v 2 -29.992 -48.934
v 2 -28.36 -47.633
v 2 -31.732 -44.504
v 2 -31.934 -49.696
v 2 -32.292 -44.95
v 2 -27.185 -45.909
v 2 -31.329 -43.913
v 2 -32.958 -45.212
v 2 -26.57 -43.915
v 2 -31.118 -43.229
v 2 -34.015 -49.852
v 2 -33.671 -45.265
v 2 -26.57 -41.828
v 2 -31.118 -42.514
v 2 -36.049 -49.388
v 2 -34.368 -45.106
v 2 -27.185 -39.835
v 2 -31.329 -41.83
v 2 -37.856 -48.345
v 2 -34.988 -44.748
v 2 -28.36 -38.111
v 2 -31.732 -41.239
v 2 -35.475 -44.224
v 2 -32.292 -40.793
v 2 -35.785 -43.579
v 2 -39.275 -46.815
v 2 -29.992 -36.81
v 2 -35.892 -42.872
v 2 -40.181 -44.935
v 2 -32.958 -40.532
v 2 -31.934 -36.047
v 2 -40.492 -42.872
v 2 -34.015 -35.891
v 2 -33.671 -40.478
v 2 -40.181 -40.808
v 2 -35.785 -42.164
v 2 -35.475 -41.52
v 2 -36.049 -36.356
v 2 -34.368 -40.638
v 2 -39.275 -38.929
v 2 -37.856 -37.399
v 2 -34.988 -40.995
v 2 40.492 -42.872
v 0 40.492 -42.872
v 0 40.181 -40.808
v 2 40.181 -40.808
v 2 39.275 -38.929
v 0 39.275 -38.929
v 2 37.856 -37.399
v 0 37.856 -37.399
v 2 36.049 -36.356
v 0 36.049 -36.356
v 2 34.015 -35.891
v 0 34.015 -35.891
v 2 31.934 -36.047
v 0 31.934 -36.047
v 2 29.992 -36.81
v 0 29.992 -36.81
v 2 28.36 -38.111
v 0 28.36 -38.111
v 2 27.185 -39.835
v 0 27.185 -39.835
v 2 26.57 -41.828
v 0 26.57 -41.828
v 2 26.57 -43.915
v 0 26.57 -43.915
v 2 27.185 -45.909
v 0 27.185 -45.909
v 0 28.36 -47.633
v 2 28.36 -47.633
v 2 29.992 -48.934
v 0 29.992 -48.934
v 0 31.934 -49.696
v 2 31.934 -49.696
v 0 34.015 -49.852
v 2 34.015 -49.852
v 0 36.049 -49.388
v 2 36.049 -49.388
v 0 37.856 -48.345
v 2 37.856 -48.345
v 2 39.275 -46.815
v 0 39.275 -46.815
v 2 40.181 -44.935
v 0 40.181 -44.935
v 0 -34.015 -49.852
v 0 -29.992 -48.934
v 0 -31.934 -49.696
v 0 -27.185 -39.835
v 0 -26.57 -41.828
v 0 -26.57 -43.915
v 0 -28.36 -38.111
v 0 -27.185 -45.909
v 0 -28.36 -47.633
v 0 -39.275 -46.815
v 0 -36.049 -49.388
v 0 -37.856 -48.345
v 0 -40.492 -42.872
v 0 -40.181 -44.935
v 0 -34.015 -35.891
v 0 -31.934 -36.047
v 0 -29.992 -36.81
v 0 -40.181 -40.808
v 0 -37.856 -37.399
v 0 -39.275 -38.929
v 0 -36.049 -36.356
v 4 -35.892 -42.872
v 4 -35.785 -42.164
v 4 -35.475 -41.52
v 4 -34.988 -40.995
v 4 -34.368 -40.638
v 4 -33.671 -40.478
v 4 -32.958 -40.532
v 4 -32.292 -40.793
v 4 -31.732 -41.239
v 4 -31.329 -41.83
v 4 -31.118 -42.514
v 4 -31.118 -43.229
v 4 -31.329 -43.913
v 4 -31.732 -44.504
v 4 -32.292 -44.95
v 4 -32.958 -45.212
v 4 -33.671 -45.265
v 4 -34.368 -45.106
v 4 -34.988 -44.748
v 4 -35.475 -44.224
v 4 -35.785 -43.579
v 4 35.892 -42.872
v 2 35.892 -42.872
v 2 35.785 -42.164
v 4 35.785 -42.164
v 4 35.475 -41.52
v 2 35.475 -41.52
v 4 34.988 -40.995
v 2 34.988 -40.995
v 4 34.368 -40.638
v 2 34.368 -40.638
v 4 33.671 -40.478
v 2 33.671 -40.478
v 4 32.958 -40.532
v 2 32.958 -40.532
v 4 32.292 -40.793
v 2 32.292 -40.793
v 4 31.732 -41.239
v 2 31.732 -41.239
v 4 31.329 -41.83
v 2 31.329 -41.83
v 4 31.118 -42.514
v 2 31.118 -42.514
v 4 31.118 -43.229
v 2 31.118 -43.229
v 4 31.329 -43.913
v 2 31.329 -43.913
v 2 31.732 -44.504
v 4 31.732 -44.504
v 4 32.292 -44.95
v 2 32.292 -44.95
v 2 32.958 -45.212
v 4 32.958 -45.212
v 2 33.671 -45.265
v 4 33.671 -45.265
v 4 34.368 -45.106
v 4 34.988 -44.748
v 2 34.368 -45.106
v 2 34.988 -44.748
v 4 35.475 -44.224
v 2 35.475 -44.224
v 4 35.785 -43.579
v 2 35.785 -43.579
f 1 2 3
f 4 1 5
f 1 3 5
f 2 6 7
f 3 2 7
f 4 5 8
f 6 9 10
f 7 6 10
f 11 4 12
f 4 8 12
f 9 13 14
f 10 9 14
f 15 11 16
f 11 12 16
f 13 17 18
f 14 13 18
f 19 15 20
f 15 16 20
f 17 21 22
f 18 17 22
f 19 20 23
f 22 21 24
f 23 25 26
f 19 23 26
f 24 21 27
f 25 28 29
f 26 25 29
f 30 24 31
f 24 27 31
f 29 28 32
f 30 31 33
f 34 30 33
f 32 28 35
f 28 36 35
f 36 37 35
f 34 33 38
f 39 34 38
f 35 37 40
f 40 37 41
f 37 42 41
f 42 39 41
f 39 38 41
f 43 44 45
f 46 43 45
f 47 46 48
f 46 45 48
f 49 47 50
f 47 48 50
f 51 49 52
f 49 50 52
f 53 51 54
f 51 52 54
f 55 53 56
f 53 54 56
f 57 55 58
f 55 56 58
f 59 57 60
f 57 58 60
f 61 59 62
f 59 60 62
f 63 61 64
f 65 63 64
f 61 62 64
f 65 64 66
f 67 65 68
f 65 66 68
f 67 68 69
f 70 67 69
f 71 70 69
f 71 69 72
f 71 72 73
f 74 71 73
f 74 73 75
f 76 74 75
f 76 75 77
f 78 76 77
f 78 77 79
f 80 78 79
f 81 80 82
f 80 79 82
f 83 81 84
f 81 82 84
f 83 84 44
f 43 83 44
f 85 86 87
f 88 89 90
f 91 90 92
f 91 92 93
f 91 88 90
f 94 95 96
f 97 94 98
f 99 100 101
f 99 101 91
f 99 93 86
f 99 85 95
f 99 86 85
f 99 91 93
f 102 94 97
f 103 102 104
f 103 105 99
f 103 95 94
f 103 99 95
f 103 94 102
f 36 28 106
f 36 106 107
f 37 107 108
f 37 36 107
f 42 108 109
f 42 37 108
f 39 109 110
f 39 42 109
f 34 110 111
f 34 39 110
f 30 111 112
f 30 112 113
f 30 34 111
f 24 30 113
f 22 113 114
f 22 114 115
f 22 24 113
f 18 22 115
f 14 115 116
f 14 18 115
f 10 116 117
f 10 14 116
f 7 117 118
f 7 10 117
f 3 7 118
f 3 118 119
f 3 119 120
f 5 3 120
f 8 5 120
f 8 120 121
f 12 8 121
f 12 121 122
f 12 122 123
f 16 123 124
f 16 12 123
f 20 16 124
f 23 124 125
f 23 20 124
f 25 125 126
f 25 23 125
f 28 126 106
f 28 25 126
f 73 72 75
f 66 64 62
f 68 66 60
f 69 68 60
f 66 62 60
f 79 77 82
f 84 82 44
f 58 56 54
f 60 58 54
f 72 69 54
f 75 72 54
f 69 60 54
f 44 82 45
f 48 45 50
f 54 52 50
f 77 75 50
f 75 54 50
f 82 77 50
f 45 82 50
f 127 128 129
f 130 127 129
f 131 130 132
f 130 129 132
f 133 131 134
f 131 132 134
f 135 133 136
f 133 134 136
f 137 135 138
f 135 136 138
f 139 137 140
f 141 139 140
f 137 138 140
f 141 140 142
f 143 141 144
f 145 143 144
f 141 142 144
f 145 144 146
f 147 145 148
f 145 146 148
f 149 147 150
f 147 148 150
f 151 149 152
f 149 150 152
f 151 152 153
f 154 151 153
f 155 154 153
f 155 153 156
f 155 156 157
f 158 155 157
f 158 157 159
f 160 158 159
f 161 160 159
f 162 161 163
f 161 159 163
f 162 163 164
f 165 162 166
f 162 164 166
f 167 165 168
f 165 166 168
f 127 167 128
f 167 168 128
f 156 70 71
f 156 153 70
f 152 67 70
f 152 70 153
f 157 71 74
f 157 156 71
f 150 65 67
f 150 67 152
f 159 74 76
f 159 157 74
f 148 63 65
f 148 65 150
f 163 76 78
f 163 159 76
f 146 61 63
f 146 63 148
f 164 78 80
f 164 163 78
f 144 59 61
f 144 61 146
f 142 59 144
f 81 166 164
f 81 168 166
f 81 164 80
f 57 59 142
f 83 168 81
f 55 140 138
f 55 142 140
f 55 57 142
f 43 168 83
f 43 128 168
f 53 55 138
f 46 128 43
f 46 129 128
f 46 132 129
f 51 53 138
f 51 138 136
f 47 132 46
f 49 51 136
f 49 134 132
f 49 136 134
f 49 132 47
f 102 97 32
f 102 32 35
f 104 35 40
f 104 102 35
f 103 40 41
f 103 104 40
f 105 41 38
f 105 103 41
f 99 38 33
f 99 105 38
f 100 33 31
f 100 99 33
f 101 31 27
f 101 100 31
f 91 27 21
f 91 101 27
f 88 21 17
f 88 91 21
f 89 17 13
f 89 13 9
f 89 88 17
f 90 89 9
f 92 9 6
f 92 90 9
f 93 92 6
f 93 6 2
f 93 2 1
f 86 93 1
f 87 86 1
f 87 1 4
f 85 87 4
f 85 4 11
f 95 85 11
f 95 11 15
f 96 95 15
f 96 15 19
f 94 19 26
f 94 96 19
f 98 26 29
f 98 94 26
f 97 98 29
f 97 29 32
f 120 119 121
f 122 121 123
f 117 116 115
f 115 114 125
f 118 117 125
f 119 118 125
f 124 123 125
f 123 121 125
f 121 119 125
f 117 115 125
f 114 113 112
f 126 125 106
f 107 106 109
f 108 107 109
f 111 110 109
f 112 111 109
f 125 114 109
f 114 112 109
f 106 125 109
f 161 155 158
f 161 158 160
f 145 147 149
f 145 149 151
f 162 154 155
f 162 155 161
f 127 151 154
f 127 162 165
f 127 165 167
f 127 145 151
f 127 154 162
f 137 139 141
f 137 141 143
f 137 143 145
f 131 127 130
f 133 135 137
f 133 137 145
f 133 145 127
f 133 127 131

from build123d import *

# Parameters (mm, degrees)
F0_R     = 7
F1_DEPTH = 2
F2_R     = 2.4
F3_DEPTH = 2


with BuildPart() as f1:
    # F0 (on Right) → F1 (new body)
    with BuildSketch(Plane.YZ):
        with Locations((33.491679, -42.87177)):
            Circle(F0_R)
    extrude(amount=F1_DEPTH)

    # F2 (on face) → F3 (join)
    with BuildSketch(Plane.YZ.offset(2)):
        with Locations((33.491679, -42.87177)):
            Circle(F2_R)
    extrude(amount=F3_DEPTH)


with BuildPart() as f4_1:
    # F4: instance of F1
    add(f1.part.mirror(Plane.XZ))


solid = Compound([f1.part, f4_1.part])
